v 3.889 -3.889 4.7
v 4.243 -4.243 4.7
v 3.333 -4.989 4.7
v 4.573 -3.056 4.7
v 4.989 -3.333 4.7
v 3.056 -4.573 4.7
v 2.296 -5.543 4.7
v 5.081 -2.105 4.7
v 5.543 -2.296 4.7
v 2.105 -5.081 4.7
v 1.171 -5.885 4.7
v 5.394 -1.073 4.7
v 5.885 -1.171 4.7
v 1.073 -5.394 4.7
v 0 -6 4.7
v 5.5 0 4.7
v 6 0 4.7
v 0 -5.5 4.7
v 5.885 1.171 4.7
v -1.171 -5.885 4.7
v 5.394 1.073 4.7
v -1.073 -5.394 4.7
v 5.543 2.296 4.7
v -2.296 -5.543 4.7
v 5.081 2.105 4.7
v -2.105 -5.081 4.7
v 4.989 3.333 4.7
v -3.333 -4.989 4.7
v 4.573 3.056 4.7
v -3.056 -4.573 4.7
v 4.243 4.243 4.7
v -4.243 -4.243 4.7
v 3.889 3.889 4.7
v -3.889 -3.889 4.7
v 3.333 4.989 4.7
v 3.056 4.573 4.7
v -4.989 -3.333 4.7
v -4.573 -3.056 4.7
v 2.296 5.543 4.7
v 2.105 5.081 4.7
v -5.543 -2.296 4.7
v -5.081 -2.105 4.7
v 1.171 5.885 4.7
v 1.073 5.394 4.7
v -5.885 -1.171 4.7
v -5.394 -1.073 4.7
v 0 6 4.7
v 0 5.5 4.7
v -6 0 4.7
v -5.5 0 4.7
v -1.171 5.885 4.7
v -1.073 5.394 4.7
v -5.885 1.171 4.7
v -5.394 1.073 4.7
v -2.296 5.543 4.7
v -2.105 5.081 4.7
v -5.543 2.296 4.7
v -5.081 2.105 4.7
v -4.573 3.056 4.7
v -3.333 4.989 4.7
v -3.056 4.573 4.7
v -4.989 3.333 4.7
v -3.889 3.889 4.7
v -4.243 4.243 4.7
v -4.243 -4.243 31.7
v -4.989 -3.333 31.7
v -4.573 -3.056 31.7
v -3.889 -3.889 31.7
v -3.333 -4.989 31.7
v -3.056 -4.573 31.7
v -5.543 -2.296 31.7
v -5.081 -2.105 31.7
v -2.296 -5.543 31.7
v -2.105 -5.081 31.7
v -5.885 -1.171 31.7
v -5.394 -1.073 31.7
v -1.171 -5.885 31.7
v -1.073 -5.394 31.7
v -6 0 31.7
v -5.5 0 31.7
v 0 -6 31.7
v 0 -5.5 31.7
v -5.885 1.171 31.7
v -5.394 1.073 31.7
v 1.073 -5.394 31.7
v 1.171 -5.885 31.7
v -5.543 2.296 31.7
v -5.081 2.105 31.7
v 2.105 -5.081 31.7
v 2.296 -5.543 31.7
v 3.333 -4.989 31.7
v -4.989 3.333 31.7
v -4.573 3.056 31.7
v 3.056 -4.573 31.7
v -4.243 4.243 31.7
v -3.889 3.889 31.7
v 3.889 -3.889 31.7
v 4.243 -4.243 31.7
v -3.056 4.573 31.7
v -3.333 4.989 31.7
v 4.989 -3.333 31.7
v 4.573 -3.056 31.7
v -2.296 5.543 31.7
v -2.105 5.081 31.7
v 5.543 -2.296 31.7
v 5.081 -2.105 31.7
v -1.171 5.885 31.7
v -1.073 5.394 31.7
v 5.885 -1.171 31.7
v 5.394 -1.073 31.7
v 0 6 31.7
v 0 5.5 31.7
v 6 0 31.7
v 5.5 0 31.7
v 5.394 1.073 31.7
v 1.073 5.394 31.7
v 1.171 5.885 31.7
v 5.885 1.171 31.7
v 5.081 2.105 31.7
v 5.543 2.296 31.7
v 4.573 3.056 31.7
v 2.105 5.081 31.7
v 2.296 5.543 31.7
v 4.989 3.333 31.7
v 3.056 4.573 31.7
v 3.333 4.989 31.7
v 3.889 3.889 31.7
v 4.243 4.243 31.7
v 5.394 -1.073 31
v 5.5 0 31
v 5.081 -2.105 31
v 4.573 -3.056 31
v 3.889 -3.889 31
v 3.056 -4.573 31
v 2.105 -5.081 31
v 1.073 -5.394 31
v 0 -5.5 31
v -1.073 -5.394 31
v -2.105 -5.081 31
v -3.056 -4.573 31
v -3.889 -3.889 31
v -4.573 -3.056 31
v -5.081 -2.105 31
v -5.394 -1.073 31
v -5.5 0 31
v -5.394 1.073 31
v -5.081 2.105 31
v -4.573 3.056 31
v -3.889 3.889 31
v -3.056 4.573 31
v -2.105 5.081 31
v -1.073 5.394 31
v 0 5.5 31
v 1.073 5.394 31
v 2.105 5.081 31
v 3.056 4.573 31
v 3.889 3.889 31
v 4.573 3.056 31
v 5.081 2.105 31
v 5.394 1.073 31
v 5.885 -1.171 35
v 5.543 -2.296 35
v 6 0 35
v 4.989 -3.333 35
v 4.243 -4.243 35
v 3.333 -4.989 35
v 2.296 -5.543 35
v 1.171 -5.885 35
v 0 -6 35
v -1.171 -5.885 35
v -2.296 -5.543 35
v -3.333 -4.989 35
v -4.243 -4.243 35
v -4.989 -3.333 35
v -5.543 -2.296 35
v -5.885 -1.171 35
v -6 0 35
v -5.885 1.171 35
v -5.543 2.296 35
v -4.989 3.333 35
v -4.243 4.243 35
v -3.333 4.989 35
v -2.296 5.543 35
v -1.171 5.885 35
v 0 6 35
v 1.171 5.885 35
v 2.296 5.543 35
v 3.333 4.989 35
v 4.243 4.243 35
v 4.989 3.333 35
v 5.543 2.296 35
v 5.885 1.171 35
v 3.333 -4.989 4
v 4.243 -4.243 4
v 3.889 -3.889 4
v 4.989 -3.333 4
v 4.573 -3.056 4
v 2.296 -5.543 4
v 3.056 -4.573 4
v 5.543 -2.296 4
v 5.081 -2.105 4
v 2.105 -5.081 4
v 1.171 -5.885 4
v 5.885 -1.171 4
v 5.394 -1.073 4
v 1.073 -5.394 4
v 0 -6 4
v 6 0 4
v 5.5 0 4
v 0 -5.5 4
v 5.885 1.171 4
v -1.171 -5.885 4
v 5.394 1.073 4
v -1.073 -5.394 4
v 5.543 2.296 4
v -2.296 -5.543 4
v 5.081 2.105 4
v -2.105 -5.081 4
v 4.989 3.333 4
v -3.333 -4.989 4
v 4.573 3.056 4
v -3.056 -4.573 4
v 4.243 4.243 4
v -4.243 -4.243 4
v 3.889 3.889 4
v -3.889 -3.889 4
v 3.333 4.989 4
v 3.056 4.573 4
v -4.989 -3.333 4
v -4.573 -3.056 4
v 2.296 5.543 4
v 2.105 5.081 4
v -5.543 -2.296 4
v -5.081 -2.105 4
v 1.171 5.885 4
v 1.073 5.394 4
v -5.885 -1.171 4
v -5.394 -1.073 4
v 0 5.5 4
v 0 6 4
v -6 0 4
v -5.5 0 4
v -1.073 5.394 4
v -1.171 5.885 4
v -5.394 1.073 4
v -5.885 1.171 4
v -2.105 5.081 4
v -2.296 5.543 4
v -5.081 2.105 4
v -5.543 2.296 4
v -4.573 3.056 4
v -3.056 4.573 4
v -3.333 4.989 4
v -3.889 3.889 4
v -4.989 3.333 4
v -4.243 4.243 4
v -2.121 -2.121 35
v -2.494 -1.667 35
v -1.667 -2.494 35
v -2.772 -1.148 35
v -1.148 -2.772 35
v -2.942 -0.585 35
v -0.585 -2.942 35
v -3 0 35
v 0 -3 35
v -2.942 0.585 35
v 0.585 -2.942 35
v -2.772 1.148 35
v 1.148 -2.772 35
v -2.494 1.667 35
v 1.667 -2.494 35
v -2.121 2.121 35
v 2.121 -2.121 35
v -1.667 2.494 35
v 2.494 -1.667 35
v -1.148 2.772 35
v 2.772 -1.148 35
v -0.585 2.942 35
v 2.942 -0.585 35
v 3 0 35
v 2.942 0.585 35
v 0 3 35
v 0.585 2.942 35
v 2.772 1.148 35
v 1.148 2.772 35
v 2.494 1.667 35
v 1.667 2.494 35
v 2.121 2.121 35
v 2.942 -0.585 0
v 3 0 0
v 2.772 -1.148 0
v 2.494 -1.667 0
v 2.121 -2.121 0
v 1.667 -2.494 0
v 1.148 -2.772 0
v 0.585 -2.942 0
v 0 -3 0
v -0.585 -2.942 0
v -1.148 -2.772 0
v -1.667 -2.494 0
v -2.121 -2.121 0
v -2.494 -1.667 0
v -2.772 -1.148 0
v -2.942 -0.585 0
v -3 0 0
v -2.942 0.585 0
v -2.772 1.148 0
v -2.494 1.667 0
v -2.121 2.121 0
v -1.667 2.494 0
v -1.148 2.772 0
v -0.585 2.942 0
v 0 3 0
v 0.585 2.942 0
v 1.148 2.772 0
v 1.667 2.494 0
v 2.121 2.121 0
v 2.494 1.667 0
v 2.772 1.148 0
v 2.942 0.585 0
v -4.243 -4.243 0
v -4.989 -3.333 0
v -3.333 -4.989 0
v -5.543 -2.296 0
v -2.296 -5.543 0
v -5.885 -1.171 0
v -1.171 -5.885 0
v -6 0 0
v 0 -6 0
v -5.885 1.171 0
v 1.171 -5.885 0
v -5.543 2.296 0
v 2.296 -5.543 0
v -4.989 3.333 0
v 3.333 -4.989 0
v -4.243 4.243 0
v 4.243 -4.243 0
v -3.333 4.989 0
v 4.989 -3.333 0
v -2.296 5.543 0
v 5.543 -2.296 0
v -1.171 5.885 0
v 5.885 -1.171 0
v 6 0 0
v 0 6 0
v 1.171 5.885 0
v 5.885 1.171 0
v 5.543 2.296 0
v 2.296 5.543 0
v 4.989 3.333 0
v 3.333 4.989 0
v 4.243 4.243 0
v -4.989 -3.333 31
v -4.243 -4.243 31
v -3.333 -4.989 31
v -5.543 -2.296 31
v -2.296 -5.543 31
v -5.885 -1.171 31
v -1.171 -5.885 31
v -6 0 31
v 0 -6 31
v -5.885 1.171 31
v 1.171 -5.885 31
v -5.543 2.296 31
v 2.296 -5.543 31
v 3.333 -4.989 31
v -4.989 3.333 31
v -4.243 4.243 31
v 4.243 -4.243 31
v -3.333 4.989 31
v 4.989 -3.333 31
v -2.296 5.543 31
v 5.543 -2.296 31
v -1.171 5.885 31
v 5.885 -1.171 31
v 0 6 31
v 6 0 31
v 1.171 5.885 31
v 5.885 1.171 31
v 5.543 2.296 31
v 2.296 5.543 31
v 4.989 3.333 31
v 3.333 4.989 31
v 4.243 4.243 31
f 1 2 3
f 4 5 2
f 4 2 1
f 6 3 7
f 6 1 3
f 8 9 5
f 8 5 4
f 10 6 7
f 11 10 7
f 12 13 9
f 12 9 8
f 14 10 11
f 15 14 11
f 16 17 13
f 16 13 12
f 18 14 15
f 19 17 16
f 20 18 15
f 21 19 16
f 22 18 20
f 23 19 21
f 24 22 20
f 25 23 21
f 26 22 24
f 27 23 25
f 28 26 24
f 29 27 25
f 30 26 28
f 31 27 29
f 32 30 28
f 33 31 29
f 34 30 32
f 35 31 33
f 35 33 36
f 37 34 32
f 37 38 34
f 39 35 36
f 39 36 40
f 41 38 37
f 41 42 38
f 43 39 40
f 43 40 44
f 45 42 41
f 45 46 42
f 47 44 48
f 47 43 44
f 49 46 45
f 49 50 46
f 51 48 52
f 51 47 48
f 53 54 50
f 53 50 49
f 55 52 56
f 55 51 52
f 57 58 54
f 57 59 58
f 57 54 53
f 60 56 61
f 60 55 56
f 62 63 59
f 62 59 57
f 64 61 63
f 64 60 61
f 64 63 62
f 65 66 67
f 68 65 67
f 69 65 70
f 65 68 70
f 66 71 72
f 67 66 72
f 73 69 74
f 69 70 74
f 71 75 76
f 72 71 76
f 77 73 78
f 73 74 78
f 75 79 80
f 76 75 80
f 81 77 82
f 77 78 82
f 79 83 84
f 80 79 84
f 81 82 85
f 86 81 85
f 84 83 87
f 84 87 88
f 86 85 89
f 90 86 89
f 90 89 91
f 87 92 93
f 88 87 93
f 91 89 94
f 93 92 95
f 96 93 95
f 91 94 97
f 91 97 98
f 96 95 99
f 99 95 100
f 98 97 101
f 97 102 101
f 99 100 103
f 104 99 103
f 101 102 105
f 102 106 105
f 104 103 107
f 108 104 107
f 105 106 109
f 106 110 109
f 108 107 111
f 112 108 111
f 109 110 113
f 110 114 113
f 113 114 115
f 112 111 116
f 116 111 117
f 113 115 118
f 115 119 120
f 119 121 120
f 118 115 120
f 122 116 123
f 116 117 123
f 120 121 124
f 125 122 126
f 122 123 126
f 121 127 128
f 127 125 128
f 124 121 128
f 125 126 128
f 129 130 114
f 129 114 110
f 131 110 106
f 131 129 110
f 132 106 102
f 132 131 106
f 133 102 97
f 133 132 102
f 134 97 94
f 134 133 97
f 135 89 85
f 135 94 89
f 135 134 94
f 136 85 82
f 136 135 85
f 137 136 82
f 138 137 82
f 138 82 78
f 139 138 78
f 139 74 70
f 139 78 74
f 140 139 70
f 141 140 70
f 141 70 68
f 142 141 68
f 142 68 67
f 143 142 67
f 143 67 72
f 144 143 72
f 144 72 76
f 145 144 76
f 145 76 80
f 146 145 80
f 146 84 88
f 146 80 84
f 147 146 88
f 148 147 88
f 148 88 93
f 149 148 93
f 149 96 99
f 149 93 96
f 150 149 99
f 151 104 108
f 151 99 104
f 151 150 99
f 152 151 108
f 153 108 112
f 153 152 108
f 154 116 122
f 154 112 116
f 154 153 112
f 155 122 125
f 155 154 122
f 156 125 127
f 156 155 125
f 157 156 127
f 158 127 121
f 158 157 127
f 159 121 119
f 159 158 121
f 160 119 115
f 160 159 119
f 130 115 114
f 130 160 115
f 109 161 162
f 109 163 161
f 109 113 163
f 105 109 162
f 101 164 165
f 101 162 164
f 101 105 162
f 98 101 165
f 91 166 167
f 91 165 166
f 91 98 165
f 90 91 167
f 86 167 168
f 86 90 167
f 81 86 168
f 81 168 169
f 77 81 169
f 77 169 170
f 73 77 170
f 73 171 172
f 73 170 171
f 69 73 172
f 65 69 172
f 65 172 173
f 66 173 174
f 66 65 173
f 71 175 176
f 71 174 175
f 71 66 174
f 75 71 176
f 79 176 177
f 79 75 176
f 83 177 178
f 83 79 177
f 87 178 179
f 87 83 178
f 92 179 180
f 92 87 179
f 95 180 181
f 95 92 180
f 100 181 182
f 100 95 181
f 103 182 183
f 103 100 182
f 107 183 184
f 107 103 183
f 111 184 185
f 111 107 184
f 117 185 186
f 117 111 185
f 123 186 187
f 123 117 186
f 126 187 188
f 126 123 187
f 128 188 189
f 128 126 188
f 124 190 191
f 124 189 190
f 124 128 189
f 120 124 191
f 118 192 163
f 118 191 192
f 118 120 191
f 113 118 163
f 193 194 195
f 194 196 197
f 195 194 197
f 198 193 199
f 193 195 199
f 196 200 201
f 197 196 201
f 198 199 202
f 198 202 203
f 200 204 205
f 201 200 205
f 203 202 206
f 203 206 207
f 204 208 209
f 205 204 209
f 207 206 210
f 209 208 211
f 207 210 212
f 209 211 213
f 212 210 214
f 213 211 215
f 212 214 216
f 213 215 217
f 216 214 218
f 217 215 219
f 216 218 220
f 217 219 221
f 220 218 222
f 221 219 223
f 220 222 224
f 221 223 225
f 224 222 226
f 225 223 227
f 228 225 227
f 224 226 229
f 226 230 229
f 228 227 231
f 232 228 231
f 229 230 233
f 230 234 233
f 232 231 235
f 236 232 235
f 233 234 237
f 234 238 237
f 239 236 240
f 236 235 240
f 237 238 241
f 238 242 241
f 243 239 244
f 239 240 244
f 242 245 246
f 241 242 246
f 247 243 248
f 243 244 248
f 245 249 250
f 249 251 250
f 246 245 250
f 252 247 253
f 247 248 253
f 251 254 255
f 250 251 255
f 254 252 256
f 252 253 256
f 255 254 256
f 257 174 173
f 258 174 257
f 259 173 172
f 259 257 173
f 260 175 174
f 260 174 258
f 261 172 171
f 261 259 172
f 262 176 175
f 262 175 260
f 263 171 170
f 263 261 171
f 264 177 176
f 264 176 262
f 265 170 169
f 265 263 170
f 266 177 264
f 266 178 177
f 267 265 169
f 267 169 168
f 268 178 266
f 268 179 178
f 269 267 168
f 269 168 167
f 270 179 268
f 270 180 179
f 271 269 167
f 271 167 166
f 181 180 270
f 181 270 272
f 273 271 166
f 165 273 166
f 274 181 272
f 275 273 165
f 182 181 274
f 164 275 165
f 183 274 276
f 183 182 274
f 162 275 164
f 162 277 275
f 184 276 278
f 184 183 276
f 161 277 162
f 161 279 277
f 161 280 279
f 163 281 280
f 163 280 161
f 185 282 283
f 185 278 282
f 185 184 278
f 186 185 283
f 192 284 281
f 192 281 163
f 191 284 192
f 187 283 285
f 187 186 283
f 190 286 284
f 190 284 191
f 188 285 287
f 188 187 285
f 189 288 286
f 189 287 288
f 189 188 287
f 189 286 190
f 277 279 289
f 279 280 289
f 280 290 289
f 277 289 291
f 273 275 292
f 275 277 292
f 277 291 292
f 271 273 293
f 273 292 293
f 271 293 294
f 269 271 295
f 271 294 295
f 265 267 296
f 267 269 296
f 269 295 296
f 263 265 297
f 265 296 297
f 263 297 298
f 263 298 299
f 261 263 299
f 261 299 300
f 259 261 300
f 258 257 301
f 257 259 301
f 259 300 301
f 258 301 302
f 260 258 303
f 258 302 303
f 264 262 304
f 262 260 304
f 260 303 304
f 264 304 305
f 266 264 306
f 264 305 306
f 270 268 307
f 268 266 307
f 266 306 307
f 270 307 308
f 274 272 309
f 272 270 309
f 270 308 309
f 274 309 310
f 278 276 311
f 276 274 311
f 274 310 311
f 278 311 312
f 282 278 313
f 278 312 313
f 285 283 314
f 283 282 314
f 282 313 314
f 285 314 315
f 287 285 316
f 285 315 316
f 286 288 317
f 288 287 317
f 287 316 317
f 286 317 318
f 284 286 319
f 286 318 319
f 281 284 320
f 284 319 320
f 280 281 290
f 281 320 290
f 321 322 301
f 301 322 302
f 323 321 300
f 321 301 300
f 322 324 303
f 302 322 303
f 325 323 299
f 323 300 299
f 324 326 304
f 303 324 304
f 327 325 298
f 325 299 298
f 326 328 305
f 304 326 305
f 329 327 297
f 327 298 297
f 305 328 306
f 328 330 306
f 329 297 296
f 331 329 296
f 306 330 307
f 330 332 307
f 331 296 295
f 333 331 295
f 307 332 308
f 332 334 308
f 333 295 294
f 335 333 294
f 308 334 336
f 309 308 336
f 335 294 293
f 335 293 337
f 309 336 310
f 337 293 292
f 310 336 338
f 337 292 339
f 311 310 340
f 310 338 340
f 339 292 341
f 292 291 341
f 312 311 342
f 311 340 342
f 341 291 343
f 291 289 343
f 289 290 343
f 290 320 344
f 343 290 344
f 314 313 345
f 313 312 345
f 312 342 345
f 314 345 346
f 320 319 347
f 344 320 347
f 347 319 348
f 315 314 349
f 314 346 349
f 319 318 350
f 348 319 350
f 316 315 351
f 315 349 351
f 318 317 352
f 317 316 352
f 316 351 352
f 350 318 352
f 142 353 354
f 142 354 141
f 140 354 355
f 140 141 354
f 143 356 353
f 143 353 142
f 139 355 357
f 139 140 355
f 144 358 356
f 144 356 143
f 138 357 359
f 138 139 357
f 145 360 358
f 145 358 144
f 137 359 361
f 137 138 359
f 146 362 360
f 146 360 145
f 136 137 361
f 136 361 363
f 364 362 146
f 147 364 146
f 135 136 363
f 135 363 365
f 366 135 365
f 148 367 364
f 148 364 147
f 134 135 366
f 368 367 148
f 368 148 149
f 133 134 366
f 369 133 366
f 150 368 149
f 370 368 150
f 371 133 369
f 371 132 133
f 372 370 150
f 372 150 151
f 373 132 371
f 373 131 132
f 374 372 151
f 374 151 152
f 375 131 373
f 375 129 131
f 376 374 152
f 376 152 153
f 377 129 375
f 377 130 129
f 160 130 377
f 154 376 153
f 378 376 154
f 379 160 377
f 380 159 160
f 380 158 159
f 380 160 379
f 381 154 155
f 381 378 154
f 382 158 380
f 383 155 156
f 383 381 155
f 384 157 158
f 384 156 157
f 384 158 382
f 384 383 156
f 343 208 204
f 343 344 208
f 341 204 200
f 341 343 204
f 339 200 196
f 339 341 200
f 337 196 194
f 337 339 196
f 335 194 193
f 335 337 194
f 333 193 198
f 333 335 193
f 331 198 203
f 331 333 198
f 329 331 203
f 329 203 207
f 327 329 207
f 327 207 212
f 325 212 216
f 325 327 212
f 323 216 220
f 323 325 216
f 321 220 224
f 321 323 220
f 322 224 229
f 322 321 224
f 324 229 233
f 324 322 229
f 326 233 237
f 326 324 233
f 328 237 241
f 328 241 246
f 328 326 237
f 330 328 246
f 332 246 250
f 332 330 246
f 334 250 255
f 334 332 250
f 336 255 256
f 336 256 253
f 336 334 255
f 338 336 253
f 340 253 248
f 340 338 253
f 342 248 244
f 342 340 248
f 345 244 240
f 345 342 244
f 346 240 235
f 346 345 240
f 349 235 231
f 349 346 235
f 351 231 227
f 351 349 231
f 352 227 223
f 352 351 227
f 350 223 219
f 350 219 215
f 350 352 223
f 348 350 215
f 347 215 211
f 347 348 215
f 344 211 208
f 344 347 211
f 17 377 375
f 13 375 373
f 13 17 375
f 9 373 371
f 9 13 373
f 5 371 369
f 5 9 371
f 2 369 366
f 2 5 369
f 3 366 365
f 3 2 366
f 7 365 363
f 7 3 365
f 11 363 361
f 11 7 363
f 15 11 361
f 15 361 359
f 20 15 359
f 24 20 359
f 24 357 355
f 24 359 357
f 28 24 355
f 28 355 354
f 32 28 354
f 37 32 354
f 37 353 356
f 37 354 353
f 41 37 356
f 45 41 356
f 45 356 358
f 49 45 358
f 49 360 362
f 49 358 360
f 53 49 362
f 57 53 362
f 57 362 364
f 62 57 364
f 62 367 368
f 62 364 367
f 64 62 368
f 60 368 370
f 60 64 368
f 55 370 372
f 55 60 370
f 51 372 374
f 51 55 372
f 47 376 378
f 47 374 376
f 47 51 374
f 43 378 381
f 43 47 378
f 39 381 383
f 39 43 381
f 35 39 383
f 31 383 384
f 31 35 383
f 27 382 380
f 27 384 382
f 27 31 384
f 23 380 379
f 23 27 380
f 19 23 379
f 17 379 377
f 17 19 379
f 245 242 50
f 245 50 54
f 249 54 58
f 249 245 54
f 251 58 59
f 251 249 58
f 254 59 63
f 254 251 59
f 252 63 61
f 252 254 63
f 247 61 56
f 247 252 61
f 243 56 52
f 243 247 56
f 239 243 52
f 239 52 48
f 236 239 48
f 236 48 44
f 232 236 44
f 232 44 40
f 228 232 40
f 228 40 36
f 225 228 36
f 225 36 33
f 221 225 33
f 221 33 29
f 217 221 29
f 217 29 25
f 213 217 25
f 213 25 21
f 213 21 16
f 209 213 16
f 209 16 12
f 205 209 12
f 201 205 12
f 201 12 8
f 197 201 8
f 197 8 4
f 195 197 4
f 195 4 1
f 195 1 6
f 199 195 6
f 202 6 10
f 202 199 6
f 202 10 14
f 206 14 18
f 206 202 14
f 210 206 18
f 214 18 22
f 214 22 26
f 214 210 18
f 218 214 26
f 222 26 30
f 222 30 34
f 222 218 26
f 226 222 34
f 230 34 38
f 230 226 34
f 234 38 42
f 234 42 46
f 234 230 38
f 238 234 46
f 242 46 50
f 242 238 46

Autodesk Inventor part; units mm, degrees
ref_plane "YZ Plane" through (0, 0, 0) normal (1, 0, 0) x (0, 1, 0)
sketch "Sketch1" plane through (0, 0, 0) normal (0, 0, 1) x (1, 0, 0)
  circle A0 centre (0, 0) radius 3
  circle A1 centre (0, 0) radius 6
  dimension "d0" = 6
  dimension "d1" = 12
extrude "Extrusion1" add sketch "Sketch1" along normal blind 35
ref_plane "Work Plane1" through (0, 0, 31) normal (0, 0, 1) x (1, 0, 0)
ref_plane "Work Plane2" through (0, 0, 4) normal (0, 0, -1) x (-1, 0, 0)
sketch "Sketch2" plane through (0, 0, 31) normal (0, 0, 1) x (1, 0, 0)
  circle A0 centre (0, 0) radius 3 projected
  circle A1 centre (0, 0) radius 6 projected
  circle A2 centre (0, 0) radius 5.5
  circle A3 centre (0, 0) radius 6
  dimension "d6" = 11
extrude "Extrusion2" cut sketch "Sketch2" along normal blind 0.7 contours A1
sketch "Sketch3" plane through (0, 0, 4) normal (0, 0, -1) x (-1, 0, 0)
  circle A0 centre (0, 0) radius 3 projected
  circle A1 centre (0, 0) radius 6 projected
  circle A2 centre (0, 0) radius 5.5
  circle A3 centre (0, 0) radius 6
  dimension "d9" = 11
extrude "Extrusion3" cut sketch "Sketch3" against normal blind 0.7 contours A1
properties part number "LinearBearing"
